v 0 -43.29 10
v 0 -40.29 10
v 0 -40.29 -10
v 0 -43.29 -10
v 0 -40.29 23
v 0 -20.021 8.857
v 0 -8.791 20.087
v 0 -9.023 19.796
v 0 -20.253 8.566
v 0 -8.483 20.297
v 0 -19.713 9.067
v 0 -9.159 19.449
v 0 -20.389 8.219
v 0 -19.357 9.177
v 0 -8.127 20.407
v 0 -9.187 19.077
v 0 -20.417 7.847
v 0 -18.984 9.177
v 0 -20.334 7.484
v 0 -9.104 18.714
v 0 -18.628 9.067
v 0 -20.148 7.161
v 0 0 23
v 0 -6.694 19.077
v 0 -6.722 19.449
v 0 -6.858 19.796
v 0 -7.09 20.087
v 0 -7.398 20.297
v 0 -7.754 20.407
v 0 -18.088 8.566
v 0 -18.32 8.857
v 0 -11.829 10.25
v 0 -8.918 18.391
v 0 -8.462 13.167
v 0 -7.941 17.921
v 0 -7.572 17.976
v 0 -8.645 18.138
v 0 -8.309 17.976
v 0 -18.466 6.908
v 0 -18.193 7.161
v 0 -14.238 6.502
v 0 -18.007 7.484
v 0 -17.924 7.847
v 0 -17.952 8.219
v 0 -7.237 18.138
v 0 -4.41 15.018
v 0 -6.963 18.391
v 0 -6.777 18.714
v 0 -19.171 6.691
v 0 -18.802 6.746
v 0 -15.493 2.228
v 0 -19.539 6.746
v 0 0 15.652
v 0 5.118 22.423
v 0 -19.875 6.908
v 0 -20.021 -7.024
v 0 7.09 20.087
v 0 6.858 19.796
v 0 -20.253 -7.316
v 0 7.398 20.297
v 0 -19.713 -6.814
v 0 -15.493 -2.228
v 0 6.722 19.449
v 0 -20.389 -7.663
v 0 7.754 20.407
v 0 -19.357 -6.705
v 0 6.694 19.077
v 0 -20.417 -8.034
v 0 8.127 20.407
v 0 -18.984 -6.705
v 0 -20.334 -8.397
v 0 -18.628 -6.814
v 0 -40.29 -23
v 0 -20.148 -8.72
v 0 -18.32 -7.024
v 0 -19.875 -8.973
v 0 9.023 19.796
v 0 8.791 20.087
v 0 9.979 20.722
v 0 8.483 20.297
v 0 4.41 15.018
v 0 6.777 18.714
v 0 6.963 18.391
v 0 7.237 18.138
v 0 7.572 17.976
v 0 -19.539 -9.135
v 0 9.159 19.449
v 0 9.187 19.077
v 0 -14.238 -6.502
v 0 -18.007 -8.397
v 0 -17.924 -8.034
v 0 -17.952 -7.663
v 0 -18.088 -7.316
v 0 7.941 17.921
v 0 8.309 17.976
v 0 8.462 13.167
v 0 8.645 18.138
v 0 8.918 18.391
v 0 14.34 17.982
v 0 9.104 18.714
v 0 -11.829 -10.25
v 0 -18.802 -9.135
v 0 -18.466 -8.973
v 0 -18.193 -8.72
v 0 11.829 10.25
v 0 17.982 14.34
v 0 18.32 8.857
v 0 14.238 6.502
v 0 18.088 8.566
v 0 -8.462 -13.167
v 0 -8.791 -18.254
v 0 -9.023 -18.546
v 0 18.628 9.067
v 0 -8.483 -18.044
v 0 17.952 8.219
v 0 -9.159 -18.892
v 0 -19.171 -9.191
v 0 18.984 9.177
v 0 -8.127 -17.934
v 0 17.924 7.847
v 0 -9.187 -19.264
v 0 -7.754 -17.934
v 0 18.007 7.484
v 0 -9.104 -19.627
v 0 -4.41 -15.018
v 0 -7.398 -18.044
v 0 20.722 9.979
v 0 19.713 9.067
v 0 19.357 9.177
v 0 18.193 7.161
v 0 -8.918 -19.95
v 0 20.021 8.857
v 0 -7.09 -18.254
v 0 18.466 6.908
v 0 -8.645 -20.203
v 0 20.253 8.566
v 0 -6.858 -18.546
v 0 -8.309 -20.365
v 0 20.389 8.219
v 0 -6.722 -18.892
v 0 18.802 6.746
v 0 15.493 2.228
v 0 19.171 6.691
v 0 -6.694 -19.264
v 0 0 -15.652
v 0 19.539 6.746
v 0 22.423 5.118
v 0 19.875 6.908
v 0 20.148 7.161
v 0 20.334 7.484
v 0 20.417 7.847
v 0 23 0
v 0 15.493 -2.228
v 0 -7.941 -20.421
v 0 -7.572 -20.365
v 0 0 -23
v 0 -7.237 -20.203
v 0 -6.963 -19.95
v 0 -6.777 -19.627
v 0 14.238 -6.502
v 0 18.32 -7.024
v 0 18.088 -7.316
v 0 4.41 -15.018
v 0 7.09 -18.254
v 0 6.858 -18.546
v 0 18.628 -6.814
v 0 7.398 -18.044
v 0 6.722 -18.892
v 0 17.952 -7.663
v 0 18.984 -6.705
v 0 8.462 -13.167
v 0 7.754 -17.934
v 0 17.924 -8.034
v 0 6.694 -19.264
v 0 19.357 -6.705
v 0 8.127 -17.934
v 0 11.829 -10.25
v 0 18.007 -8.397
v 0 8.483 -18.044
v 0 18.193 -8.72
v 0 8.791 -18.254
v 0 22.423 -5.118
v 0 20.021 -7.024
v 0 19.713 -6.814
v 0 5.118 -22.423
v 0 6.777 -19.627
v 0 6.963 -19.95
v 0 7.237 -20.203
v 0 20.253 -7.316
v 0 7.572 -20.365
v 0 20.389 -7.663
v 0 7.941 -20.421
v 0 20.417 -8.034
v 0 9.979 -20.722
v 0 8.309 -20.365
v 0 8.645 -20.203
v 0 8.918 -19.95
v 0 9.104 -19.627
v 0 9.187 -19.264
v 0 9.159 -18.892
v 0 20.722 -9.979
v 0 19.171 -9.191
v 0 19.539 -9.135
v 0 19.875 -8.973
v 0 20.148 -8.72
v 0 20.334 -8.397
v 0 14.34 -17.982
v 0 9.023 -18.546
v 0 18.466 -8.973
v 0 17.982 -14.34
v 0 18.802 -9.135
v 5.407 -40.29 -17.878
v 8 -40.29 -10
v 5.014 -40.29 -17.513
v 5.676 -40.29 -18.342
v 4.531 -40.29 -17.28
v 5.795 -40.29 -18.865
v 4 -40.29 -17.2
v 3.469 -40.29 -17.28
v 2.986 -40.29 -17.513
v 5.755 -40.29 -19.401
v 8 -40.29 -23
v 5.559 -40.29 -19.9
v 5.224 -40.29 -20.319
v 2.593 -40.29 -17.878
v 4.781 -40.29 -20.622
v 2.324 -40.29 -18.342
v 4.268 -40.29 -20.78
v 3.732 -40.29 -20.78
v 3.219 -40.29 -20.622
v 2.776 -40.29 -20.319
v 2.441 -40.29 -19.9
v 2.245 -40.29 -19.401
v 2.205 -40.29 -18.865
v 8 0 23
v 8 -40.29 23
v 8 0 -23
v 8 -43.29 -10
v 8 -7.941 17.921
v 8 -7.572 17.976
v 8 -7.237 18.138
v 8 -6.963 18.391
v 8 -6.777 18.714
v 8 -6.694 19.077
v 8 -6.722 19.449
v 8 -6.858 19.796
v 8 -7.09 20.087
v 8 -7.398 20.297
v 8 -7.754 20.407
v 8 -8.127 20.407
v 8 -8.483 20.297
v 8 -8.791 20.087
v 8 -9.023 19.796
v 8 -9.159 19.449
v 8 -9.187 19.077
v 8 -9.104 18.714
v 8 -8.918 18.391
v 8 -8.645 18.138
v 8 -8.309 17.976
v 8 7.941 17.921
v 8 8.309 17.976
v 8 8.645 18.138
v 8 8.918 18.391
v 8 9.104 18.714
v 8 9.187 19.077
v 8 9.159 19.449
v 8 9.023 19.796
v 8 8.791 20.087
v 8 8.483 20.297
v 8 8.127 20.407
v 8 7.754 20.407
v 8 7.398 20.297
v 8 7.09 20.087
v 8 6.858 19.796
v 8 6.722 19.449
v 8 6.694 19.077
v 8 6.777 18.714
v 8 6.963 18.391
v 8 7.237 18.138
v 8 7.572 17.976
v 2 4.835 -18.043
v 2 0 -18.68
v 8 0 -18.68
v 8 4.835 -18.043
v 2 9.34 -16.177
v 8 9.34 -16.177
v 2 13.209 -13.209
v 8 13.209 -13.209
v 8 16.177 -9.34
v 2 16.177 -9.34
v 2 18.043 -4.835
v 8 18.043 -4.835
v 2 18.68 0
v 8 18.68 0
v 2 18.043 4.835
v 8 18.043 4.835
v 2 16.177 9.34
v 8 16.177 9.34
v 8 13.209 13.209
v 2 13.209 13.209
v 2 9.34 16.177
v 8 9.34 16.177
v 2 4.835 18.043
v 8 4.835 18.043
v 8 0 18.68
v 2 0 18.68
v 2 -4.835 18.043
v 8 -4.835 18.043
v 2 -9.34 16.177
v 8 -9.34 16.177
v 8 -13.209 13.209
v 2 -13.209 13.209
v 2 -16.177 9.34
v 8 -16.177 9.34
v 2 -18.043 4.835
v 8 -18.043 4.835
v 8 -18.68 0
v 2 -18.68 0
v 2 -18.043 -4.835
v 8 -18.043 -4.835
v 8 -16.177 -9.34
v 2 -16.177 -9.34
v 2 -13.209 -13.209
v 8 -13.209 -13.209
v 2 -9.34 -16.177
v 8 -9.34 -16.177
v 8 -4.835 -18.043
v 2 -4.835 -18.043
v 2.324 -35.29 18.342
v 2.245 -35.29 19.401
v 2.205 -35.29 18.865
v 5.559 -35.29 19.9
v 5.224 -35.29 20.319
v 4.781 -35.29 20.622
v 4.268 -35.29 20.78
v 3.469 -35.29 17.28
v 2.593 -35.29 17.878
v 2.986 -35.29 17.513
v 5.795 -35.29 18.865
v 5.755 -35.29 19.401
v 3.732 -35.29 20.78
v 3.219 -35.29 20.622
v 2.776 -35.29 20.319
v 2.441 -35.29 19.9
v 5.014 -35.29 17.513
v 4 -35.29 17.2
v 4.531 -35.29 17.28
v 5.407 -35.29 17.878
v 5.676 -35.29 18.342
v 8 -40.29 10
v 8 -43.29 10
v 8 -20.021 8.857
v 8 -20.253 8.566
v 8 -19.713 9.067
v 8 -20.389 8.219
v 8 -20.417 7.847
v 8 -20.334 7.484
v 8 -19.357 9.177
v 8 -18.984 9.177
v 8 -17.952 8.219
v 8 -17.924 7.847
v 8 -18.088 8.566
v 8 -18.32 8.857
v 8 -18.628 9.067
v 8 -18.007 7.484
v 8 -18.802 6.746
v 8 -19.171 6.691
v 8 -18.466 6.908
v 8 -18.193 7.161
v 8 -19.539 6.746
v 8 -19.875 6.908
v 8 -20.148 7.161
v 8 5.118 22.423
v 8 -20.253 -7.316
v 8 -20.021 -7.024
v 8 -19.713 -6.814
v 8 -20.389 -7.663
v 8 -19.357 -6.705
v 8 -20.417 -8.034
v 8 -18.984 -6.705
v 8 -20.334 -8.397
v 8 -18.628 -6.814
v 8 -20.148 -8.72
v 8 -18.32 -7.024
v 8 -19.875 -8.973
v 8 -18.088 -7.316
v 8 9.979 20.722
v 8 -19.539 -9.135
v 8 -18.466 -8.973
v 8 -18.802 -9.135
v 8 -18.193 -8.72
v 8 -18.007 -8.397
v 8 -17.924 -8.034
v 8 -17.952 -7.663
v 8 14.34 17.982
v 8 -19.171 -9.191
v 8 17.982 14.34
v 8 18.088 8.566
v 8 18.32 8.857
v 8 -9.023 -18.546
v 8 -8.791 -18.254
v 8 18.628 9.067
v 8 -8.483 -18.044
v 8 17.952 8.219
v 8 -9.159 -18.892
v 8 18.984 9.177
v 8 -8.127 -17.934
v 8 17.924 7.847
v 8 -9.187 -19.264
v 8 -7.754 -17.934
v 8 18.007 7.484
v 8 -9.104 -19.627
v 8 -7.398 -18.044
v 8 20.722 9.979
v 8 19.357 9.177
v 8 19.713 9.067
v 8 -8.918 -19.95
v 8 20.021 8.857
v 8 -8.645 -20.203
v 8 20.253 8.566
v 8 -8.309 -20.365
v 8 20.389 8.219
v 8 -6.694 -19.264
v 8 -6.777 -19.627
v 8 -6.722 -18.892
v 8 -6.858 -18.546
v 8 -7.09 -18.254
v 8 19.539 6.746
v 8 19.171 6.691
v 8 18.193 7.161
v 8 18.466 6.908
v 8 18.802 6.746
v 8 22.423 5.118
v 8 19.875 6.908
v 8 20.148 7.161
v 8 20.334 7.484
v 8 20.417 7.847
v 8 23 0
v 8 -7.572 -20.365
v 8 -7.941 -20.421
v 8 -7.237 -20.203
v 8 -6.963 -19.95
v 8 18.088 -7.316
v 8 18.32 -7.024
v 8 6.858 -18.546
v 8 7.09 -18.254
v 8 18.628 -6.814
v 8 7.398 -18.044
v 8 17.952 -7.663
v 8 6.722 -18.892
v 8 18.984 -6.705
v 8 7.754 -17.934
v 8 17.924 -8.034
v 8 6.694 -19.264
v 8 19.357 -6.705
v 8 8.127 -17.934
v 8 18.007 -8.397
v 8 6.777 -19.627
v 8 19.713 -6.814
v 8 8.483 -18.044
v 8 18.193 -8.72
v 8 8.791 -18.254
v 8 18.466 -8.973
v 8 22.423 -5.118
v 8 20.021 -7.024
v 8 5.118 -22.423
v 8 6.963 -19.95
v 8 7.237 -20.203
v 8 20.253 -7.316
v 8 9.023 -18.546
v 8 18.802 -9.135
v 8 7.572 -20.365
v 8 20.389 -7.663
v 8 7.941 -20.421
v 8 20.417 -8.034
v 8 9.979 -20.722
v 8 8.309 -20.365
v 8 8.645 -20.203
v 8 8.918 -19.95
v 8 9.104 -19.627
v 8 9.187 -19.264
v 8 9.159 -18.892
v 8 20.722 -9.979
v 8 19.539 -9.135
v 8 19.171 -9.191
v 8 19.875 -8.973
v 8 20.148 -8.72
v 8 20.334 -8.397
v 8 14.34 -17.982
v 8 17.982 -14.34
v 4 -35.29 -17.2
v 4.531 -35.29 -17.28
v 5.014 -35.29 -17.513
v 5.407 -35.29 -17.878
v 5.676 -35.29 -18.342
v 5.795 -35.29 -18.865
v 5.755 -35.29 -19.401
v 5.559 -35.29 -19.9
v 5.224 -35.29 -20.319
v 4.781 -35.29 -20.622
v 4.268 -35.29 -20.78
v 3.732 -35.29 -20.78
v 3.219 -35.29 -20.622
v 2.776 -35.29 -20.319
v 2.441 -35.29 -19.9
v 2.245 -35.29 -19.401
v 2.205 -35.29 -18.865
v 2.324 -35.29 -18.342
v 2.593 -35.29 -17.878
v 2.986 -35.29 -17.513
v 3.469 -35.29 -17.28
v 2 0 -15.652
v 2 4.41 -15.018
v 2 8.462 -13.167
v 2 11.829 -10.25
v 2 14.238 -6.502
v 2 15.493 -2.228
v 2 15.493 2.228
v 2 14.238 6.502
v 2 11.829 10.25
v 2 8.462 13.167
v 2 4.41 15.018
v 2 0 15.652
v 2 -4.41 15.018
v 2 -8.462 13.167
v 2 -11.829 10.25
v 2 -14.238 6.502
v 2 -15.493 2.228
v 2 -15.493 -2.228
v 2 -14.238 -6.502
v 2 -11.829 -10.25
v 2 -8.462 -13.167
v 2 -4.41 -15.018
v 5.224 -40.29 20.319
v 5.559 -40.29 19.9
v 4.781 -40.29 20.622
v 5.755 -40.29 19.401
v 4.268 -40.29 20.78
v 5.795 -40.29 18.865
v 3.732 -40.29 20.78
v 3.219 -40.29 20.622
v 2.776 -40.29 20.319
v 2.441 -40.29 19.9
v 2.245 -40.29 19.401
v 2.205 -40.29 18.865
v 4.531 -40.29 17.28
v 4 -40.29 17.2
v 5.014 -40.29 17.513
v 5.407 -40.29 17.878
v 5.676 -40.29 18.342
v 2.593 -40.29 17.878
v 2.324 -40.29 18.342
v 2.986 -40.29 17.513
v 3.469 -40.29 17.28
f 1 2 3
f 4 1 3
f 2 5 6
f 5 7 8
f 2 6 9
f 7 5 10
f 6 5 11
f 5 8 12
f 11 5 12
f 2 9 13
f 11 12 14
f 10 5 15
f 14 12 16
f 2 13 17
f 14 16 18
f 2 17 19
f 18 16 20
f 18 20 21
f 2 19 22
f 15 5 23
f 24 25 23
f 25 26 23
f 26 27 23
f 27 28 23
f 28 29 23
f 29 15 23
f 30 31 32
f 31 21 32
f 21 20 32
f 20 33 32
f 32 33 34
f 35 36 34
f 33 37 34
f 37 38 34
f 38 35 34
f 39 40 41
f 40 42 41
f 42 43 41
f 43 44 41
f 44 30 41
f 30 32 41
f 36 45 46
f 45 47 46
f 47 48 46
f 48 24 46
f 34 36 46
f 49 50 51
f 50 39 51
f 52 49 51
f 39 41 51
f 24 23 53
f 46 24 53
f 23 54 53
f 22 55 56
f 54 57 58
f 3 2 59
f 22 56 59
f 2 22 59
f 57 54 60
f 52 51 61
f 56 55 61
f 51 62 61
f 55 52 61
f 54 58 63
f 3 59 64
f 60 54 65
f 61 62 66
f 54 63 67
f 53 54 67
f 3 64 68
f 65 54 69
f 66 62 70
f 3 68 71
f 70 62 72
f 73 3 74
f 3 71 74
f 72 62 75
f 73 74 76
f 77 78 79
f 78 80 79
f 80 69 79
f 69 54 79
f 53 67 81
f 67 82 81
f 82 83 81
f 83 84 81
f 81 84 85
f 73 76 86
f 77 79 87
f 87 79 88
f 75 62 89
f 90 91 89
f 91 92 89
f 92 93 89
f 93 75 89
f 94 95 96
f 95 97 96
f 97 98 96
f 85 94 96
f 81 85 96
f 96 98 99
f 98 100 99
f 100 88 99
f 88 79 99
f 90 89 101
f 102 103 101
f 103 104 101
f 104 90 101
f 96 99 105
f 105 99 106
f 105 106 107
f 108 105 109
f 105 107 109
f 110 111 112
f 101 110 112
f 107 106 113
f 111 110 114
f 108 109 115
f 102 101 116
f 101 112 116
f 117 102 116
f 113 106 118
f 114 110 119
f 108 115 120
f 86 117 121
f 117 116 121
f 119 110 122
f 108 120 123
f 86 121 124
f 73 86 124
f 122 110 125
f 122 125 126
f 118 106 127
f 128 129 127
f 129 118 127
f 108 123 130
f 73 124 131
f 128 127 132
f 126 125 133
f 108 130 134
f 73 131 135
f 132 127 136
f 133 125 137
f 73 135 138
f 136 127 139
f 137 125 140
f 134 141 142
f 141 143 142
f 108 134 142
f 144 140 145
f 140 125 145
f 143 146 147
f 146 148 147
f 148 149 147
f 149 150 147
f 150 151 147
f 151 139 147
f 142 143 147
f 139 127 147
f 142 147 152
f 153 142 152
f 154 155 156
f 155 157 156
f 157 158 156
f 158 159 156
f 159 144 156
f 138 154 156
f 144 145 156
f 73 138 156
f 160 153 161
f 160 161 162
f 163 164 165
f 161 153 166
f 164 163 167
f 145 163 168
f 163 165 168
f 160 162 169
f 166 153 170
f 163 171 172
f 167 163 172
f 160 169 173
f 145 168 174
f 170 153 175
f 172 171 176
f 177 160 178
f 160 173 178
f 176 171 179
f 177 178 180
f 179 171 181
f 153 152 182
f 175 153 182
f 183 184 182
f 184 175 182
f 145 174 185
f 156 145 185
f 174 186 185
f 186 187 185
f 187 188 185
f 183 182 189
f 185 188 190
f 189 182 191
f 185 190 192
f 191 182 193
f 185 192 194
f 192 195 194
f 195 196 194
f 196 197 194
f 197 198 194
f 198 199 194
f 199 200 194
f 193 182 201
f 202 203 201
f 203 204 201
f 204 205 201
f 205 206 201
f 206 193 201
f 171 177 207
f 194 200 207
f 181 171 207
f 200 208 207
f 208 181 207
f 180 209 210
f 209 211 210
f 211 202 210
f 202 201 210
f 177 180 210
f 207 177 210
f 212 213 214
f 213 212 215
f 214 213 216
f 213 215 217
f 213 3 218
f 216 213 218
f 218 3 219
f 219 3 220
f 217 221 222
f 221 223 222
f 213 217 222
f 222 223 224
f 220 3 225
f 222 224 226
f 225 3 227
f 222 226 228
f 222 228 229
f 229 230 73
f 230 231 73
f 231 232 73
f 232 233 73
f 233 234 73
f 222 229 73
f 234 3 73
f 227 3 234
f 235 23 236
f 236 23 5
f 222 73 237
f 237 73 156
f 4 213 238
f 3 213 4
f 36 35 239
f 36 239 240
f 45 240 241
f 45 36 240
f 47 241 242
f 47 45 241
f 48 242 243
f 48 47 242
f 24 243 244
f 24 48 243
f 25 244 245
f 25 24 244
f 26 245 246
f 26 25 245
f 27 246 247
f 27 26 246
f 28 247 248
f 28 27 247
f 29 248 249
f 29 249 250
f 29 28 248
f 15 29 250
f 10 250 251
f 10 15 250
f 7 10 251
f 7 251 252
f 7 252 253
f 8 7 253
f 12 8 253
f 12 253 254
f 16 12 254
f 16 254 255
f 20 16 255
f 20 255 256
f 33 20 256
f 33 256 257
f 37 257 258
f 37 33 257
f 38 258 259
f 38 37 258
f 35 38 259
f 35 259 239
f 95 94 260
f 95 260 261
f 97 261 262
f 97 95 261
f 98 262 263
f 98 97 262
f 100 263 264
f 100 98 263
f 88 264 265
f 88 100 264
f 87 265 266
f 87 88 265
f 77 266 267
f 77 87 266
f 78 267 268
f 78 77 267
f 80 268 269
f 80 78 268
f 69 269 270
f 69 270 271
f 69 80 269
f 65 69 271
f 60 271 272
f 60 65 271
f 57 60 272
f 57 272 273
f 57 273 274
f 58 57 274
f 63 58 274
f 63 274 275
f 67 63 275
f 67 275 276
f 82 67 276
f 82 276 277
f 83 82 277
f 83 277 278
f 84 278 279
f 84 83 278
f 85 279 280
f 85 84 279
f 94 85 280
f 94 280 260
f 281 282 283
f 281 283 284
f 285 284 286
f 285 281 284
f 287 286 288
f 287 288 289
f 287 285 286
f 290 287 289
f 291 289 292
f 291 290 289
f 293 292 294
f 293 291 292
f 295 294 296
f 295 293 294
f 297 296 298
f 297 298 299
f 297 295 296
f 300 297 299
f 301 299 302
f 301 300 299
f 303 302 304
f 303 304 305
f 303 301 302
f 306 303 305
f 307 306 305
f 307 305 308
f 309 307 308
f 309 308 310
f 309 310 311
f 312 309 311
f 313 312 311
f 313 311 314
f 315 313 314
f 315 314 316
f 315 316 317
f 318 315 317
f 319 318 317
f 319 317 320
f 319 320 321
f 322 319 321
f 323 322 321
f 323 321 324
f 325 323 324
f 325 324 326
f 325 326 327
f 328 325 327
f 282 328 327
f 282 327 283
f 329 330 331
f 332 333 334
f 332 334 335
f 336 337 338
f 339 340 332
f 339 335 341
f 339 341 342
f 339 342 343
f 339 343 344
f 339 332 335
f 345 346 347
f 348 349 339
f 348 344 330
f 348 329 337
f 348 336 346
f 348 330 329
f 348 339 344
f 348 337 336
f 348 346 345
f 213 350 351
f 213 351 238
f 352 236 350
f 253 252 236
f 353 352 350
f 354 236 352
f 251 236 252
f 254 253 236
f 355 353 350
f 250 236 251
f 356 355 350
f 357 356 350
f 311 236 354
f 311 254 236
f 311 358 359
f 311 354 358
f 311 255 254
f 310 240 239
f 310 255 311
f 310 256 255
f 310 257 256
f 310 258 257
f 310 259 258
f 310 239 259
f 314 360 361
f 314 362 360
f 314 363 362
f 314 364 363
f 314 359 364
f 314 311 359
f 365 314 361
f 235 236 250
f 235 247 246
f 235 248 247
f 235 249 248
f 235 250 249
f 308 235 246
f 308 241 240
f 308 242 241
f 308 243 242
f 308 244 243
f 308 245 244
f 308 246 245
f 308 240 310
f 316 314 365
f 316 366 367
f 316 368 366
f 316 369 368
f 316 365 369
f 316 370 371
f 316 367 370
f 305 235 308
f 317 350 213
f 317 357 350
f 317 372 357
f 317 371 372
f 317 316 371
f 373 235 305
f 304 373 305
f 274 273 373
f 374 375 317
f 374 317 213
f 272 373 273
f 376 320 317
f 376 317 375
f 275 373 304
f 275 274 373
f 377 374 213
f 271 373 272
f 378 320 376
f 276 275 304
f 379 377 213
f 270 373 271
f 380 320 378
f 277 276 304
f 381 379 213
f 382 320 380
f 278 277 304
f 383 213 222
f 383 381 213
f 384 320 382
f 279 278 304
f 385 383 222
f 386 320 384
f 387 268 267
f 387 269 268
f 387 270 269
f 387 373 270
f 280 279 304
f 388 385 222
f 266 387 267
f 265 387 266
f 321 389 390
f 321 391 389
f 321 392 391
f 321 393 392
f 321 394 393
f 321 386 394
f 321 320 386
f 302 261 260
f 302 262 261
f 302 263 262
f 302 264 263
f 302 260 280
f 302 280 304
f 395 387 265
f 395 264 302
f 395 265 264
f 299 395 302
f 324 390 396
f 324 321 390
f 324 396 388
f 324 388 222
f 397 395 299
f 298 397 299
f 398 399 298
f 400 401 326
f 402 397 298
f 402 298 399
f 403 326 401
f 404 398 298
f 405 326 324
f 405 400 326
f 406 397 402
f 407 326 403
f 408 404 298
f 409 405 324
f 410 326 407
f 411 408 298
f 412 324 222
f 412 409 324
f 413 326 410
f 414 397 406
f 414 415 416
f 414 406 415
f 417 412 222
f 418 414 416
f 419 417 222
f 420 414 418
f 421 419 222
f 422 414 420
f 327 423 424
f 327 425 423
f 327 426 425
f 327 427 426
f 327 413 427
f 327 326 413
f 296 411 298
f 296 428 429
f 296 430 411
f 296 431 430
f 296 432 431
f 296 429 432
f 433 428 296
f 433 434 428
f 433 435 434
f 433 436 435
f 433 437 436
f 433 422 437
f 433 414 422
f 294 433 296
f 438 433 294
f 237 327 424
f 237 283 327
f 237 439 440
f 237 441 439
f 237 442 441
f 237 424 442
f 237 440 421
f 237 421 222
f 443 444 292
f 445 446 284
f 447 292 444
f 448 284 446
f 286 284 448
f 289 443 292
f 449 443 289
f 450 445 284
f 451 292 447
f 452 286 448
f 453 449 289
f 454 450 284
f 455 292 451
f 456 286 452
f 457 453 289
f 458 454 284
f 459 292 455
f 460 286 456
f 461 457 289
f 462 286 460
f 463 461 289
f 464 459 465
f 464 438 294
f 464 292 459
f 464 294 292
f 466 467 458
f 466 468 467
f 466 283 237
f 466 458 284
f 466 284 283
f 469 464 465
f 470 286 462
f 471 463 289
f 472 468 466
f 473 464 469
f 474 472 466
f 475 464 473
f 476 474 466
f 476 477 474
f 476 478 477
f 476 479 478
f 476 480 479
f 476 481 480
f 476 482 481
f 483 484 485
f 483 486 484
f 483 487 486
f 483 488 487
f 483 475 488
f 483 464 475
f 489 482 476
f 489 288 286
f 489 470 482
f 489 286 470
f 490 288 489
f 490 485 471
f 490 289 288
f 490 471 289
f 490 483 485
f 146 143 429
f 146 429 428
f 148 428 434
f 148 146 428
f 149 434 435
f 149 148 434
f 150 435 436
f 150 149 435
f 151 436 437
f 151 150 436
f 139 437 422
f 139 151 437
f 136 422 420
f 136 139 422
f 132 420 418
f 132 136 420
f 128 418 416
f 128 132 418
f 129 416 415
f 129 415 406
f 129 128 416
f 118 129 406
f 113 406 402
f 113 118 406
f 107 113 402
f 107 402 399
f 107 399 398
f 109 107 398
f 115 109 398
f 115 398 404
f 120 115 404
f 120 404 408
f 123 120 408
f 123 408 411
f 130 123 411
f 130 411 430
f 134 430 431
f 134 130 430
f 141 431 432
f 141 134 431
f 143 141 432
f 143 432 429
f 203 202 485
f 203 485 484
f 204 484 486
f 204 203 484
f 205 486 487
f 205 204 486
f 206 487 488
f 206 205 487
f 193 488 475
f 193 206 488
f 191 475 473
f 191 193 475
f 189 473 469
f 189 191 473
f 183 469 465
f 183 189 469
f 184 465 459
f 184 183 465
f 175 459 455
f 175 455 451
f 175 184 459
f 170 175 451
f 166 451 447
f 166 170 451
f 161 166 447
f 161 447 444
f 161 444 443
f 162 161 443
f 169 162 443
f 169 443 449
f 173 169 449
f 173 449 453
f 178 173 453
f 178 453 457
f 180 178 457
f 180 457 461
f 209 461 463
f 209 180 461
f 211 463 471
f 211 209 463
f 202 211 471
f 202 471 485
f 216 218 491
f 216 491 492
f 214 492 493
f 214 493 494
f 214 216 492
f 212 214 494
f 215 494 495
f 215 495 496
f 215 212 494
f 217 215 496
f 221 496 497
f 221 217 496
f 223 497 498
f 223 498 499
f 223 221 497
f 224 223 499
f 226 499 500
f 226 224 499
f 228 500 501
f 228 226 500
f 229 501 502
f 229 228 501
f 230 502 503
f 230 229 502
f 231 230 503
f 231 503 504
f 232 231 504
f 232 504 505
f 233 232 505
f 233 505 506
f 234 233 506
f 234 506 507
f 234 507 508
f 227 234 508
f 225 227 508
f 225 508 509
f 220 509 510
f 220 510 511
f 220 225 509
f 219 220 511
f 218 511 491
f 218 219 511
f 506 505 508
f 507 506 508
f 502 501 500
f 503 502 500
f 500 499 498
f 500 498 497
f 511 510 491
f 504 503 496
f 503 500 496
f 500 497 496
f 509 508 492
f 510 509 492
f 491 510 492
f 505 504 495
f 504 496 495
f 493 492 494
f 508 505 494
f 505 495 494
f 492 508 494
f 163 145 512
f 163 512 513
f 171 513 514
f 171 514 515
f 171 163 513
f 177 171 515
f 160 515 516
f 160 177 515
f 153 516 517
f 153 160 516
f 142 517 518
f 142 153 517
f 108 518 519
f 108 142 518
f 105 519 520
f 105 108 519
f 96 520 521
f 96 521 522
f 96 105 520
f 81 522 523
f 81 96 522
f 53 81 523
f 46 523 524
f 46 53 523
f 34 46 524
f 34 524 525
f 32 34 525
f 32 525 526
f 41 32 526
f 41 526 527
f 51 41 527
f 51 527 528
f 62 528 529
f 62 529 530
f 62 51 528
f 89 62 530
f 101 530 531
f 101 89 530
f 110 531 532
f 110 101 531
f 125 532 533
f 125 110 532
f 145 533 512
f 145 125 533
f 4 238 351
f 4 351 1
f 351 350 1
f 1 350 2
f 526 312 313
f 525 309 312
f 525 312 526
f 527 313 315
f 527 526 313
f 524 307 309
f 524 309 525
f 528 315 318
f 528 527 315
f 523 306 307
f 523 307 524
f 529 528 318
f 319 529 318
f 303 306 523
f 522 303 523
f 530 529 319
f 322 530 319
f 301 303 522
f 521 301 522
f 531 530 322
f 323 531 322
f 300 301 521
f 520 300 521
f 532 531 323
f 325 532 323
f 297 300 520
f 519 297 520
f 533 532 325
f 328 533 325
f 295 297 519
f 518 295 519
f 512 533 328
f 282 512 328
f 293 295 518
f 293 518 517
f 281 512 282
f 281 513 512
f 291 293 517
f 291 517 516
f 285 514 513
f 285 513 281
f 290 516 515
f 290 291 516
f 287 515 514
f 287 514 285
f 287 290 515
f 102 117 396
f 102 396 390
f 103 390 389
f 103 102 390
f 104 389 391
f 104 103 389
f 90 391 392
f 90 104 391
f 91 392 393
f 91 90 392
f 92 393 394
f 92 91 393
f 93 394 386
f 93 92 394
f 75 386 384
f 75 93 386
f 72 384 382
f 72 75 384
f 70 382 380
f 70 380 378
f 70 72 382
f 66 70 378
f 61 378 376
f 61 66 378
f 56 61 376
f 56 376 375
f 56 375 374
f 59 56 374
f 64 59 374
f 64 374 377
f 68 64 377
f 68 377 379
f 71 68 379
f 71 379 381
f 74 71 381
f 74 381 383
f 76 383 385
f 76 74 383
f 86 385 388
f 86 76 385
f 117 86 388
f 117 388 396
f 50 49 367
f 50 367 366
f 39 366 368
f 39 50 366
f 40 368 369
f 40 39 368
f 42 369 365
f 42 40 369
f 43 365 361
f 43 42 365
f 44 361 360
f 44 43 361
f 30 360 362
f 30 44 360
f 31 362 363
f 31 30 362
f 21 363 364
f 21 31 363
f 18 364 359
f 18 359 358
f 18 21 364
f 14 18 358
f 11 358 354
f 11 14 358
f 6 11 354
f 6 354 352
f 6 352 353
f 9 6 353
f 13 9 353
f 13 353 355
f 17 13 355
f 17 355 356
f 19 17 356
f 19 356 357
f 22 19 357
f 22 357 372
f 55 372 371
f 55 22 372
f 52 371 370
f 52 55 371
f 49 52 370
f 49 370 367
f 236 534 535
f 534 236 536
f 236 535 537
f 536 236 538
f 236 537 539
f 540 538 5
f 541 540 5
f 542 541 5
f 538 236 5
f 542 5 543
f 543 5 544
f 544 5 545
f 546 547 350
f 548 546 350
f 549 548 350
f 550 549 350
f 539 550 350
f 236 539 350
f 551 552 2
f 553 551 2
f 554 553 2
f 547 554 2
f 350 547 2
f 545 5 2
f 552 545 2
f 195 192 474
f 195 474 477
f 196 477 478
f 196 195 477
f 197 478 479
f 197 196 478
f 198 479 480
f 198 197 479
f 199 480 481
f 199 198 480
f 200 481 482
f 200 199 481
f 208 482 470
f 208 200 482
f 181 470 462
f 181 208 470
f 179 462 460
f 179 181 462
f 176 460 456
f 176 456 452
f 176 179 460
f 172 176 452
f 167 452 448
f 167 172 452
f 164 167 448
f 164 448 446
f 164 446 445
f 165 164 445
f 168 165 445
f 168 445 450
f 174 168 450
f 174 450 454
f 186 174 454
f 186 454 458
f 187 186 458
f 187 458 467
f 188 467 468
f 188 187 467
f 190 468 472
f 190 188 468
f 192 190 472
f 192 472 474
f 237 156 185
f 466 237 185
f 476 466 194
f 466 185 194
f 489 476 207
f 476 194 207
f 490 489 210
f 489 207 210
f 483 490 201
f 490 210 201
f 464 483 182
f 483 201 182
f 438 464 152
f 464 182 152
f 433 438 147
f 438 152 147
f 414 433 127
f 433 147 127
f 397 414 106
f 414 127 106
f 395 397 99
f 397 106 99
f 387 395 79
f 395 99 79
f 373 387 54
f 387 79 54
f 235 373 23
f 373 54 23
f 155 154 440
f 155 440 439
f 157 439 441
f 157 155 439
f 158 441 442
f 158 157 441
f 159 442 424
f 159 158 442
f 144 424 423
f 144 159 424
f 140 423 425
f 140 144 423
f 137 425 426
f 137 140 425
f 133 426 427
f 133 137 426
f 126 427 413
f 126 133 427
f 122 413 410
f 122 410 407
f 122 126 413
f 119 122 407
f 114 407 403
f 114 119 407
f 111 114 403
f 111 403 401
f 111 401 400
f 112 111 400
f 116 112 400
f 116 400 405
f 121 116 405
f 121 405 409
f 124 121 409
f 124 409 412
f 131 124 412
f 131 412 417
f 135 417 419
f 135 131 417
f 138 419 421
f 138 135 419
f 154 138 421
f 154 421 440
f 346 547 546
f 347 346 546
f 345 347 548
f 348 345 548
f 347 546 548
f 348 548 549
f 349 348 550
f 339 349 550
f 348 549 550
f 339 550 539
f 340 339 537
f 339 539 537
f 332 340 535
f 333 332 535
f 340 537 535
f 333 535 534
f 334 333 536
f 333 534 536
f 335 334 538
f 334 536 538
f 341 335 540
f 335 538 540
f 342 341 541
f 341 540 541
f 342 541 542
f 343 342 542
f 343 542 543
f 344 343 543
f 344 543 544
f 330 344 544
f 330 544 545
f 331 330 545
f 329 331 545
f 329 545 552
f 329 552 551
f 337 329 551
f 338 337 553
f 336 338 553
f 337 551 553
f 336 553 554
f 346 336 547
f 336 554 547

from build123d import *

# Parameters (mm, degrees)
SKETCH_1_R          = 18.68
SKETCH_1_R_2        = 15.652173913
EXTRUDE_2_DEPTH     = 2
SKETCH_1_4_R        = 23
SKETCH_1_4_R_2      = 1.25
SKETCH_1_4_R_3      = 18.68
EXTRUDE_3_DEPTH     = 8
EXTRUDE_4_DEPTH     = 8
SKETCH_3_R          = 1.8
CUT_EXTRUDE_1_DEPTH = 5
SKETCH_4_W          = 8
SKETCH_4_H          = 20
EXTRUDE_5_DEPTH     = 3


with BuildPart() as part:
    # 草图1 → 凸台-拉伸2 (new body)
    with BuildSketch(Plane(origin=(0, 0, 0), x_dir=(0, 0, -1), z_dir=(1, 0, 0))):
        Circle(SKETCH_1_R)
        Circle(SKETCH_1_R_2, mode=Mode.SUBTRACT)
    extrude(amount=EXTRUDE_2_DEPTH)

    # 草图1<4> → 凸台-拉伸3 (add)
    with BuildSketch(Plane(origin=(0, 0, 0), x_dir=(0, 0, -1), z_dir=(1, 0, 0))):
        Circle(SKETCH_1_4_R)
        with Locations((-7.940681222, -19.1705003)):
            Circle(SKETCH_1_4_R_2, mode=Mode.SUBTRACT)
        with Locations((-19.1705003, -7.940681222)):
            Circle(SKETCH_1_4_R_2, mode=Mode.SUBTRACT)
        with Locations((7.940681222, -19.1705003)):
            Circle(SKETCH_1_4_R_2, mode=Mode.SUBTRACT)
        with Locations((19.1705003, -7.940681222)):
            Circle(SKETCH_1_4_R_2, mode=Mode.SUBTRACT)
        with Locations((-19.1705003, 7.940681222)):
            Circle(SKETCH_1_4_R_2, mode=Mode.SUBTRACT)
        with Locations((-7.940681222, 19.1705003)):
            Circle(SKETCH_1_4_R_2, mode=Mode.SUBTRACT)
        Circle(SKETCH_1_4_R_3, mode=Mode.SUBTRACT)
        with Locations((19.1705003, 7.940681222)):
            Circle(SKETCH_1_4_R_2, mode=Mode.SUBTRACT)
        with Locations((7.940681222, 19.1705003)):
            Circle(SKETCH_1_4_R_2, mode=Mode.SUBTRACT)
    extrude(amount=EXTRUDE_3_DEPTH)

    # 草图2 → 凸台-拉伸4 (add)
    with BuildSketch(Plane.ZY):
        with BuildLine():
            Line((-23, -40.29), (-23, 0))
            ThreePointArc((-23, 0), (0, -23), (23, 0))
            Line((23, 0), (23, -40.29))
            Line((23, -40.29), (-23, -40.29))
        make_face()
    extrude(amount=-EXTRUDE_4_DEPTH)

    # 草图3 → 切除-拉伸1 (cut)
    with BuildSketch(Plane.XZ.offset(40.29)):
        with Locations((4, 19)):
            Circle(SKETCH_3_R)
    cut_extrude_1 = extrude(amount=-CUT_EXTRUDE_1_DEPTH, mode=Mode.SUBTRACT)

    # 镜向1: 切除-拉伸1 across plane
    add(cut_extrude_1.mirror(Plane(origin=(0, 0, 0), x_dir=(1, 0, 0), z_dir=(0, 0, -1))), mode=Mode.SUBTRACT)

    # 草图4 → 凸台-拉伸5 (add)
    with BuildSketch(Plane(origin=(0, -40.29, 0), x_dir=(-1, 0, 0), z_dir=(0, -1, 0))):
        with Locations((-4, 0)):
            Rectangle(SKETCH_4_W, SKETCH_4_H)
    extrude(amount=EXTRUDE_5_DEPTH)


solid = part.part
